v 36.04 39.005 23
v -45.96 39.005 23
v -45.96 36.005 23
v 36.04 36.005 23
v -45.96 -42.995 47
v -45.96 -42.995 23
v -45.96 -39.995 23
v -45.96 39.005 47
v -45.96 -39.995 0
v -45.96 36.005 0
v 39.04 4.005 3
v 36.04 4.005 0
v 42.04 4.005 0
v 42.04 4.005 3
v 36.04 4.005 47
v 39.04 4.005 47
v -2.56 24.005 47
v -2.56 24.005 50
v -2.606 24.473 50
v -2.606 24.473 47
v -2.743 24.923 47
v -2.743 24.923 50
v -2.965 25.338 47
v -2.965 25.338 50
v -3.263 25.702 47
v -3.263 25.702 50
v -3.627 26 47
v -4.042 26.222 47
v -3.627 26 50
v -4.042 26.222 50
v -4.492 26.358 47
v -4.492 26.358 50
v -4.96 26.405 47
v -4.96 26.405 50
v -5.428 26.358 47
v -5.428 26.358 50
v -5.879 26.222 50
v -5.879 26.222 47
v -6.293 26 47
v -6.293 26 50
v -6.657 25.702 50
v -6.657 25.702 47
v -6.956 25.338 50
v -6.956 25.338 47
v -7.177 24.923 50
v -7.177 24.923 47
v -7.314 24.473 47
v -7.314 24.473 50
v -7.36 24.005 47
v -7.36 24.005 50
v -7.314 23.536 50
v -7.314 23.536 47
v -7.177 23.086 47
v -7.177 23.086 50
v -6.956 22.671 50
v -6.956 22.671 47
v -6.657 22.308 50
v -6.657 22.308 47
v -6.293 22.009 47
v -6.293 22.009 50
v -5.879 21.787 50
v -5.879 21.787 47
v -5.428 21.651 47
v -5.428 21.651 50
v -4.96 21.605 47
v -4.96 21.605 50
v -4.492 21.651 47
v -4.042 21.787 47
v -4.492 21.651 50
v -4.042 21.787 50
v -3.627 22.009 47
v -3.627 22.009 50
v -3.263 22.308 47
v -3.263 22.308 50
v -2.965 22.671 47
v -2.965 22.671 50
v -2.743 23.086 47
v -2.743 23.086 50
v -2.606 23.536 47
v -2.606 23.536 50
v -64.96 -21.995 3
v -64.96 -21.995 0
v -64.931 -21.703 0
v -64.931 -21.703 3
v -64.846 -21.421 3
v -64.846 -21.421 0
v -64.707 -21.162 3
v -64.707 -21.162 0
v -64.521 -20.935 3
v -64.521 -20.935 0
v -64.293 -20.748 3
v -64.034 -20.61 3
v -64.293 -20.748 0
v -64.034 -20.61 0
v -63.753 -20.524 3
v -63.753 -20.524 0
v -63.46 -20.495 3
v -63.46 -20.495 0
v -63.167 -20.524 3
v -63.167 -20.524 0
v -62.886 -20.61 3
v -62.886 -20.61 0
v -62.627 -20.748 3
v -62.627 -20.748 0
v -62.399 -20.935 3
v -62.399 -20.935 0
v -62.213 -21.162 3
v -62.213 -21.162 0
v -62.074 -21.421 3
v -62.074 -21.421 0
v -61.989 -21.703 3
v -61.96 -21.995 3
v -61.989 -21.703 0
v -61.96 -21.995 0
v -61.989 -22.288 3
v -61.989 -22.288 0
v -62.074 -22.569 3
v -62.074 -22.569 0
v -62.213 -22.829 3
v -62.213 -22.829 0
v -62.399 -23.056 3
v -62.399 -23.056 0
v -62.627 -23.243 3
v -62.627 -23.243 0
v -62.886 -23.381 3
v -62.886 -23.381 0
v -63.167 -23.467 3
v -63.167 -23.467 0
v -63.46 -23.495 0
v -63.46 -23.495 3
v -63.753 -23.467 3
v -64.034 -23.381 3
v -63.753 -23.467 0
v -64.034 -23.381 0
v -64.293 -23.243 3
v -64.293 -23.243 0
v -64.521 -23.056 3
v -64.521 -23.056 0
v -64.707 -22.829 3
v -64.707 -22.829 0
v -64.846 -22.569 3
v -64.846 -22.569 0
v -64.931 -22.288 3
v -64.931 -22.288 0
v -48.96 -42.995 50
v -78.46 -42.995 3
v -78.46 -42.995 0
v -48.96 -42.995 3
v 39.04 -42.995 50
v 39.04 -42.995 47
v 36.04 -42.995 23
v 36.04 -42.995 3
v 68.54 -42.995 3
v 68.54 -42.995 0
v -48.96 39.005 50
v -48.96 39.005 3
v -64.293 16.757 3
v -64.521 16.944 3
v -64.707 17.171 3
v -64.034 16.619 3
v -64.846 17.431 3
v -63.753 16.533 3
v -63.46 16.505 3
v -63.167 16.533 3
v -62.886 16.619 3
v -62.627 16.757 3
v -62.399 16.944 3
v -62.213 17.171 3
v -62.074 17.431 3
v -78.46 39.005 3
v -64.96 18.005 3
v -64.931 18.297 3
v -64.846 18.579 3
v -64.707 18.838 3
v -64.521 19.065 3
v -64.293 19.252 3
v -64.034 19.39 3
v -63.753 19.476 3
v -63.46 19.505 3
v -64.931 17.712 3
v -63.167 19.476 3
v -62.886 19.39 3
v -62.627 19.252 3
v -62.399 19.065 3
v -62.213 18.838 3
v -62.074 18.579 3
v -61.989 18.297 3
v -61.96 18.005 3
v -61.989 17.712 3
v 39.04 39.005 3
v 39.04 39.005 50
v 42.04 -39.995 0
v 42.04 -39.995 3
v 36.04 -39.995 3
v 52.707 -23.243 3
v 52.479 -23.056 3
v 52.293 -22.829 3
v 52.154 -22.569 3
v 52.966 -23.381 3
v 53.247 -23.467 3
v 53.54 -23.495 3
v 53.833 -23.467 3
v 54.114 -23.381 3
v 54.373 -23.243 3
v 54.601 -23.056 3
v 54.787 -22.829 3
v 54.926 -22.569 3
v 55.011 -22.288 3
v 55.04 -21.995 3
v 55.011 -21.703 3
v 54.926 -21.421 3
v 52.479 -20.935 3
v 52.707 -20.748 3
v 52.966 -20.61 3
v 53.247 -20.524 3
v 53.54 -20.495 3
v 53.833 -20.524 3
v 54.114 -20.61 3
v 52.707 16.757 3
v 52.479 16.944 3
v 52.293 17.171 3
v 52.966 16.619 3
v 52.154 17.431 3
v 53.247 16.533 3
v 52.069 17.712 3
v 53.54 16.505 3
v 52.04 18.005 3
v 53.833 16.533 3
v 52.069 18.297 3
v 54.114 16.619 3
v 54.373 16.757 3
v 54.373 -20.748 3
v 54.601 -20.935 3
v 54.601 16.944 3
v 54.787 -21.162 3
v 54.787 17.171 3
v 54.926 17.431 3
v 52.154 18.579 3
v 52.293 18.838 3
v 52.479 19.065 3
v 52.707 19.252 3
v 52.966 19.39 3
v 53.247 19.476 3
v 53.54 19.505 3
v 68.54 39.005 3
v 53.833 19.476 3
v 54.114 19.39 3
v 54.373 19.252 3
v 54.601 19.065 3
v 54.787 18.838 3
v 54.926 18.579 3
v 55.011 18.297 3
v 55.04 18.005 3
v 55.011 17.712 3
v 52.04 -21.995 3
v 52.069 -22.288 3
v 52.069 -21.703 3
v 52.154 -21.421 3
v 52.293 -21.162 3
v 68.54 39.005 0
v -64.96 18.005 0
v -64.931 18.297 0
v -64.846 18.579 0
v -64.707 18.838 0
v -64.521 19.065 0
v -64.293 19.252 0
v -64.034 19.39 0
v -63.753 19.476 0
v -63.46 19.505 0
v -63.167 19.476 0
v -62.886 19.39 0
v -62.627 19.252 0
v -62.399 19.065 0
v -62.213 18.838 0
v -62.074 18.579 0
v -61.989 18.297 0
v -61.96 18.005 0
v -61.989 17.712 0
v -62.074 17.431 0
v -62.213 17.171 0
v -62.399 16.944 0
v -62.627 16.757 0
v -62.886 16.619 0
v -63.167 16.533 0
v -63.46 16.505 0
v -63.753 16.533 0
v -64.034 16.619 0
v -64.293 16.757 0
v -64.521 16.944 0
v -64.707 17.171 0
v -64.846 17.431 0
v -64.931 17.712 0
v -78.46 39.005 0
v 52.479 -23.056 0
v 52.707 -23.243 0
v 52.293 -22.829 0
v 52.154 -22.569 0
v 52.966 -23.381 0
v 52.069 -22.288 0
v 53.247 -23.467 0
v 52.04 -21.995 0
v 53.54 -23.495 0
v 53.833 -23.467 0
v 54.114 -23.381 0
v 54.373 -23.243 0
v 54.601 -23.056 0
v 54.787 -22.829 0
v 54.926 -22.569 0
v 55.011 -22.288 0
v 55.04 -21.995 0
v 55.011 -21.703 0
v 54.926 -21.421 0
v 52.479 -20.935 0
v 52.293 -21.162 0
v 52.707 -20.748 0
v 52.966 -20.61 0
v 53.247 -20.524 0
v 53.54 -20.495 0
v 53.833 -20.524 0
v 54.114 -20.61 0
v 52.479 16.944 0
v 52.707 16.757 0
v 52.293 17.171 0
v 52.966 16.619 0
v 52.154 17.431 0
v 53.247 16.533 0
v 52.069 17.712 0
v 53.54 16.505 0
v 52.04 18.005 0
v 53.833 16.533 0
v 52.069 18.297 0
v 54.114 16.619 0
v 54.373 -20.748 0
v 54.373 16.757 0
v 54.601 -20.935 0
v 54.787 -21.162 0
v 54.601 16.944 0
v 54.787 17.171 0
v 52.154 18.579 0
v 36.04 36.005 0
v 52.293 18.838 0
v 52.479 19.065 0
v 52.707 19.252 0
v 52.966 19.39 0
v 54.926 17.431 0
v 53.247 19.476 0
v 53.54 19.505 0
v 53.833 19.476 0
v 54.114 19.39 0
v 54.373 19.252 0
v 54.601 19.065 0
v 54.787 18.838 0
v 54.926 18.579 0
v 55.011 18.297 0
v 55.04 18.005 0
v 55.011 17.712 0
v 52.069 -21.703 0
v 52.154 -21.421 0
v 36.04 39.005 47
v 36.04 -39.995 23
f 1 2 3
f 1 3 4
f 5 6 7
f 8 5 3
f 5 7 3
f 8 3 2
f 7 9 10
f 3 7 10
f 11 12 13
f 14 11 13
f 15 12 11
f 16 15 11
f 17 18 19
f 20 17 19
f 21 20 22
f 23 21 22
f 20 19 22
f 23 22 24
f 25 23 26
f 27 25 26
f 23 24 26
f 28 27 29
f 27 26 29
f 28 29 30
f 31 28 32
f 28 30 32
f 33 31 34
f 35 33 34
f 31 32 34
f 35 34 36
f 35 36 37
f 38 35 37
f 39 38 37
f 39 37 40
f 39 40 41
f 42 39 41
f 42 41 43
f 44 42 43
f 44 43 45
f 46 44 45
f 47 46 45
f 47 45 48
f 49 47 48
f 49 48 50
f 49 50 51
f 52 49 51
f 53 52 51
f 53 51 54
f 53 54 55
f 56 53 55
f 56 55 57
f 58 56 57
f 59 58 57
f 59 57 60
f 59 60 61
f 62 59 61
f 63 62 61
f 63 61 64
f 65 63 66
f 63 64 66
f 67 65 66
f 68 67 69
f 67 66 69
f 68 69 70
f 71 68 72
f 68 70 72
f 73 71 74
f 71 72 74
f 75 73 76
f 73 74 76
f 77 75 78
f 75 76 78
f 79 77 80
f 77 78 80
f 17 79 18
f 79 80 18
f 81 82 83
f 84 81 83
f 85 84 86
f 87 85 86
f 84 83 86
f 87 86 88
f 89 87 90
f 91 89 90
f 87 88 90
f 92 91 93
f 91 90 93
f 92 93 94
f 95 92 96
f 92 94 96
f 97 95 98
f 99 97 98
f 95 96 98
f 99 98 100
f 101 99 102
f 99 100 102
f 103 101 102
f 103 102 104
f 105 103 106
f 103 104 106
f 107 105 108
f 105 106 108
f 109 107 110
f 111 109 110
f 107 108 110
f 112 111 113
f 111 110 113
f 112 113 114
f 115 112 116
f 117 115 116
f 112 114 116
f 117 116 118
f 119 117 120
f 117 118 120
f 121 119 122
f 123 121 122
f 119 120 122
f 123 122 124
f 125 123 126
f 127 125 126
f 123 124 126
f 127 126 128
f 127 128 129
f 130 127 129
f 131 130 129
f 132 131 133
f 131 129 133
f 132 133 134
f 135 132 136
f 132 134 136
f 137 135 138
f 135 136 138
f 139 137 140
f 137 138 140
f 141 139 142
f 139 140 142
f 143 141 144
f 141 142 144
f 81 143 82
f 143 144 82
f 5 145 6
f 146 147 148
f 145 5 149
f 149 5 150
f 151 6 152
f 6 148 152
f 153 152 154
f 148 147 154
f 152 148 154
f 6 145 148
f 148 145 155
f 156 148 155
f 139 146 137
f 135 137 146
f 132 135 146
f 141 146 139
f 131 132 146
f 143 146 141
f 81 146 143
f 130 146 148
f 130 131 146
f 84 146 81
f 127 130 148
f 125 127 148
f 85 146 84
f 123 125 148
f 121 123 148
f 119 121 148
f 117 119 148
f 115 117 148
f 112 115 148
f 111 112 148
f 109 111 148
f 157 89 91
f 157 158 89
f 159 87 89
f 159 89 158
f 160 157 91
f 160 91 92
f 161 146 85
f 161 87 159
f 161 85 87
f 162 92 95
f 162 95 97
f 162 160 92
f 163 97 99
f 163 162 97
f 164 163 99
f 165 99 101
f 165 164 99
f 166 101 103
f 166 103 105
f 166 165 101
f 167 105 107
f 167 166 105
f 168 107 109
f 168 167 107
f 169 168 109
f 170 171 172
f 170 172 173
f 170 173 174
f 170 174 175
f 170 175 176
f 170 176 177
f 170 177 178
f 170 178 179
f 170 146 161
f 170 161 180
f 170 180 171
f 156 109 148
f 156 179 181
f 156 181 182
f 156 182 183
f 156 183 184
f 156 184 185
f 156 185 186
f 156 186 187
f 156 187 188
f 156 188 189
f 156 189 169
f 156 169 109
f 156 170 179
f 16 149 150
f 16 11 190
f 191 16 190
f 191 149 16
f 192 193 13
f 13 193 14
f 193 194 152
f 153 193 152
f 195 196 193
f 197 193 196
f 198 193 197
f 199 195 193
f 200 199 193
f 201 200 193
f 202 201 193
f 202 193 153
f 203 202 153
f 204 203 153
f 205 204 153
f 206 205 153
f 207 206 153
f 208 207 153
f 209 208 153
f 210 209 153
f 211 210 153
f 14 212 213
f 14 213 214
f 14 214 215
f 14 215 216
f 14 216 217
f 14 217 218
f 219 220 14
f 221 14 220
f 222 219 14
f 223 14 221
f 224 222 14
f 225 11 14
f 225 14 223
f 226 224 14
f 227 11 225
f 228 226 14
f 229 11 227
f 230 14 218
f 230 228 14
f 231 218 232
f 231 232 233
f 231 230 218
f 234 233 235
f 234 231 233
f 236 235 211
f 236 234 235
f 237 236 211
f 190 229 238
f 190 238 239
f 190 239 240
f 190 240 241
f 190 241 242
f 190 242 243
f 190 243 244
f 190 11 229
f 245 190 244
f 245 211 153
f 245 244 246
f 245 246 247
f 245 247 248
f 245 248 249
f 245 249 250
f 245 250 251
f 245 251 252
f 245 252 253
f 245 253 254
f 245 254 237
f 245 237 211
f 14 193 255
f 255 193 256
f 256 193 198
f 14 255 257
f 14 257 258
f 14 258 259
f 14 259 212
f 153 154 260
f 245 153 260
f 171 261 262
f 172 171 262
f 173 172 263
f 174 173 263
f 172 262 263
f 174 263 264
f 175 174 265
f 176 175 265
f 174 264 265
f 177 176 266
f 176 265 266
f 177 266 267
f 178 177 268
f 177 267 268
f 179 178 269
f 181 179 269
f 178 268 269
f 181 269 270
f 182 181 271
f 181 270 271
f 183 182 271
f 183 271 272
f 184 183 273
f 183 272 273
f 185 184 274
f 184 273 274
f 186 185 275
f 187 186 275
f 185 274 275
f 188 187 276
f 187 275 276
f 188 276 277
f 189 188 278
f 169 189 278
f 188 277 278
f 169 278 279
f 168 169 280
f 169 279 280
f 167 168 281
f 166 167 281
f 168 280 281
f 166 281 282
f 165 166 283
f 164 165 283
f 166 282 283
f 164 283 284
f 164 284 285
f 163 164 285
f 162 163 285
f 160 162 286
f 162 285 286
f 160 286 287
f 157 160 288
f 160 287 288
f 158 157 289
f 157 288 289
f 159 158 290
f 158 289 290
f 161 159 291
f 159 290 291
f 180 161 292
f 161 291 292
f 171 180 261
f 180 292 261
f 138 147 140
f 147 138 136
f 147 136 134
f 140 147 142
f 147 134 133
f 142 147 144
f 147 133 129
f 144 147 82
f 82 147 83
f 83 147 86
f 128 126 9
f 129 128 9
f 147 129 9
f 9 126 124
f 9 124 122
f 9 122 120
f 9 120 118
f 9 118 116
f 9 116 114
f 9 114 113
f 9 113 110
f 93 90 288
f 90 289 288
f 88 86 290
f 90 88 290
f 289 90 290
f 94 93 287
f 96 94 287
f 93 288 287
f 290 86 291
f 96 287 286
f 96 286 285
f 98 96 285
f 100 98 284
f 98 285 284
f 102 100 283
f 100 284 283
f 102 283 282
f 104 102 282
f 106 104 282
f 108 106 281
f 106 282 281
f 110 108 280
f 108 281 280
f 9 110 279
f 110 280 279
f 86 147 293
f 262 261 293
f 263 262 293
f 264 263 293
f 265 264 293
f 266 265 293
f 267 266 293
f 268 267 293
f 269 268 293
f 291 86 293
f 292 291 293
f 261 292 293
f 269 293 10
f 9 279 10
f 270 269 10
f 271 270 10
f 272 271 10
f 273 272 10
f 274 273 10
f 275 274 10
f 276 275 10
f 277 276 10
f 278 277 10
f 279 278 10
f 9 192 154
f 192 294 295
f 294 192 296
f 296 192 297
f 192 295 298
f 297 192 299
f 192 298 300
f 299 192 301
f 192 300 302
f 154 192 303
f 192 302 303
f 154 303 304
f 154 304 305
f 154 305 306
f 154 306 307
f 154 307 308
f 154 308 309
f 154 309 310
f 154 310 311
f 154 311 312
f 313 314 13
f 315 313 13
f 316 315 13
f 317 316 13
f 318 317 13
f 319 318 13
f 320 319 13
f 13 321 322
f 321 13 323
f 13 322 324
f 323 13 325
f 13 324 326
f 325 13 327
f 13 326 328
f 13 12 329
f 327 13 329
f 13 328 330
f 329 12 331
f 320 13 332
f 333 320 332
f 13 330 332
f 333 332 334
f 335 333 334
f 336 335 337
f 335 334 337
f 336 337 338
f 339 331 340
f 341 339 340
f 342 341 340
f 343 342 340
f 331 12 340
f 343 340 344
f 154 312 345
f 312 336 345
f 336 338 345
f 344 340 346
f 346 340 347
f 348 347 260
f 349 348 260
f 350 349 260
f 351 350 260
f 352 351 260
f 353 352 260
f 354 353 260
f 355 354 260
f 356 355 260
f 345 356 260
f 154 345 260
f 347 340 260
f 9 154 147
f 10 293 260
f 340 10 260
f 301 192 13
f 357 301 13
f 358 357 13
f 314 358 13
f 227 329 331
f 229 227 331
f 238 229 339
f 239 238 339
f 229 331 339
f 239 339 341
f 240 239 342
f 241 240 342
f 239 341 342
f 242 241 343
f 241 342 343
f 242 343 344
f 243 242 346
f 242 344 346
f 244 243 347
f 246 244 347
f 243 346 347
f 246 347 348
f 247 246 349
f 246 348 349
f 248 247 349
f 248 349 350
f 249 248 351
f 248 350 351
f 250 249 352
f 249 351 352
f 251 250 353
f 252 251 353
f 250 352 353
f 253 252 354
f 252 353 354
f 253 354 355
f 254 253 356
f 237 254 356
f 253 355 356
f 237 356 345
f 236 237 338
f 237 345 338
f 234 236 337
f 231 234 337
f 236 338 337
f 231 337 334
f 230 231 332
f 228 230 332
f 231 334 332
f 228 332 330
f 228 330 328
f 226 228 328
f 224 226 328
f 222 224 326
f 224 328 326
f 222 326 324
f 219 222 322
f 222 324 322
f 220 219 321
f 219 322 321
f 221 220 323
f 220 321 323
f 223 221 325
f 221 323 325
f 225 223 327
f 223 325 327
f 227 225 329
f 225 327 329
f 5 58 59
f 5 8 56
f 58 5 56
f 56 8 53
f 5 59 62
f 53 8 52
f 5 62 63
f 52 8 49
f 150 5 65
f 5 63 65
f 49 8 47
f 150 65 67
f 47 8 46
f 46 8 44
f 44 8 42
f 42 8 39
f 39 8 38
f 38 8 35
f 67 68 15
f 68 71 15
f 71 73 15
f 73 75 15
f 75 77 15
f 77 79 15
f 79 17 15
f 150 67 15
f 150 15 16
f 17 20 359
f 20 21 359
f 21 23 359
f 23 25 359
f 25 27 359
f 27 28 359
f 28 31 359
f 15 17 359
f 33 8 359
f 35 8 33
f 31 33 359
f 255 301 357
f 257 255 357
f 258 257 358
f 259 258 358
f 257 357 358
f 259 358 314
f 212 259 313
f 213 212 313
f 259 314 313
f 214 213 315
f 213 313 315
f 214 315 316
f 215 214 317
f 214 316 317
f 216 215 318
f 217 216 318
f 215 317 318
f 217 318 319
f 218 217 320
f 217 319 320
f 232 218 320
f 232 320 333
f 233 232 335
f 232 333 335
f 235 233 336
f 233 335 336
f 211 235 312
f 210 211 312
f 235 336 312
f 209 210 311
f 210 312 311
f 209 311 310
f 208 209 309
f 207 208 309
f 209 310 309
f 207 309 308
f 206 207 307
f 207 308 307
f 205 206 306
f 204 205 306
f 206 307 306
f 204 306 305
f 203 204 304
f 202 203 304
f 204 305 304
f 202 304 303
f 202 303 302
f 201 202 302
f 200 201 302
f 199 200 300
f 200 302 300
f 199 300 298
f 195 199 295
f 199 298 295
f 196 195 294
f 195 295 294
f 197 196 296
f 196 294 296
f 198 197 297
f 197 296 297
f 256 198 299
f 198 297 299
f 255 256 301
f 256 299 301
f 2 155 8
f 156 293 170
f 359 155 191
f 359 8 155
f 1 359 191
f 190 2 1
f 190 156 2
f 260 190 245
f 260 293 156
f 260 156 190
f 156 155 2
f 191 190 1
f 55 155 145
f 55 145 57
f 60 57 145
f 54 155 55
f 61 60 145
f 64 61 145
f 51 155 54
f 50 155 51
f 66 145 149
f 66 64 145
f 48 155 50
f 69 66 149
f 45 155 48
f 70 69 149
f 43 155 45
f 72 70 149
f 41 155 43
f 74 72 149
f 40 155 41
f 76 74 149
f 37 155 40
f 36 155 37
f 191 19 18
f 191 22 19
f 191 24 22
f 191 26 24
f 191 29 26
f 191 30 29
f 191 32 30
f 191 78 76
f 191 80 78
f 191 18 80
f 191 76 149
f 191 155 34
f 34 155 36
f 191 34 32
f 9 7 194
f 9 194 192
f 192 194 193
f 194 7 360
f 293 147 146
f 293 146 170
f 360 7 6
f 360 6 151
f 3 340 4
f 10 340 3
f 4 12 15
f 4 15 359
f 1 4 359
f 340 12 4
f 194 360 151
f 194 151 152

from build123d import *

# Parameters (mm, degrees)
SKETCH_1_W          = 147
SKETCH_1_H          = 82
EXTRUDE_1_DEPTH     = 50
SKETCH_2_W          = 29.5
SKETCH_2_H          = 82
CUT_EXTRUDE_1_DEPTH = 47
SKETCH_3_W          = 29.5
SKETCH_3_H          = 82
CUT_EXTRUDE_2_DEPTH = 47
SKETCH_5_W          = 82
SKETCH_5_H          = 76
CUT_EXTRUDE_3_DEPTH = 47
SKETCH_6_R          = 2.4
CUT_EXTRUDE_4_DEPTH = 4
SKETCH_7_W          = 82
SKETCH_7_H          = 24
CUT_EXTRUDE_5_DEPTH = 84
SKETCH_9_W          = 44
SKETCH_9_H          = 47
CUT_EXTRUDE_6_DEPTH = 3
SKETCH_10_W         = 6
SKETCH_10_H         = 44
CUT_EXTRUDE_7_DEPTH = 7
SKETCH_12_R         = 1.5
CUT_EXTRUDE_8_DEPTH = 3


with BuildPart() as part:
    # 草图1 → 凸台-拉伸1 (new body)
    with BuildSketch(Plane.XY):
        with Locations((-4.960122699, -1.995398773)):
            Rectangle(SKETCH_1_W, SKETCH_1_H)
    extrude(amount=EXTRUDE_1_DEPTH)

    # 草图2 → 切除-拉伸1 (cut)
    with BuildSketch(Plane.XY.offset(50)):
        with Locations((-63.710122699, -1.995398773)):
            Rectangle(SKETCH_2_W, SKETCH_2_H)
    extrude(amount=-CUT_EXTRUDE_1_DEPTH, mode=Mode.SUBTRACT)

    # 草图3 → 切除-拉伸2 (cut)
    with BuildSketch(Plane.XY.offset(50)):
        with Locations((53.789877301, -1.995398773)):
            Rectangle(SKETCH_3_W, SKETCH_3_H)
    extrude(amount=-CUT_EXTRUDE_2_DEPTH, mode=Mode.SUBTRACT)

    # 草图5 → 切除-拉伸3 (cut)
    with BuildSketch(Plane(origin=(0, 0, 0), x_dir=(-1, 0, 0), z_dir=(0, 0, -1))):
        with Locations((4.960122699, -1.995398773)):
            Rectangle(SKETCH_5_W, SKETCH_5_H)
    extrude(amount=-CUT_EXTRUDE_3_DEPTH, mode=Mode.SUBTRACT)

    # 草图6 → 切除-拉伸4 (cut)
    with BuildSketch(Plane.XY.offset(50)):
        with Locations((-4.960122699, 24.004601227)):
            Circle(SKETCH_6_R)
    extrude(amount=-CUT_EXTRUDE_4_DEPTH, mode=Mode.SUBTRACT)

    # 草图7 → 切除-拉伸5 (cut)
    with BuildSketch(Plane(origin=(0, 39.004601227, 0), x_dir=(1, 0, 0), z_dir=(0, 1, 0))):
        with Locations((-4.960122699, -35)):
            Rectangle(SKETCH_7_W, SKETCH_7_H)
    extrude(amount=-CUT_EXTRUDE_5_DEPTH, mode=Mode.SUBTRACT)

    # 草图9 → 切除-拉伸6 (cut)
    with BuildSketch(Plane(origin=(39.039877301, 0, 0), x_dir=(0, 0, -1), z_dir=(1, 0, 0))):
        with Locations((-25, -19.495398773)):
            Rectangle(SKETCH_9_W, SKETCH_9_H)
    extrude(amount=-CUT_EXTRUDE_6_DEPTH, mode=Mode.SUBTRACT)

    # 草图10 → 切除-拉伸7 (cut)
    with BuildSketch(Plane.XY.offset(3)):
        with Locations((39.039877301, -17.995398773)):
            Rectangle(SKETCH_10_W, SKETCH_10_H)
    extrude(amount=-CUT_EXTRUDE_7_DEPTH, mode=Mode.SUBTRACT)

    # 草图12 → 切除-拉伸8 (cut)
    with BuildSketch(Plane(origin=(0, 0, 0), x_dir=(-1, 0, 0), z_dir=(0, 0, -1))):
        with Locations((63.460122699, 18.004601227)):
            Circle(SKETCH_12_R)
        with Locations((63.460122699, -21.995398773)):
            Circle(SKETCH_12_R)
        with Locations((-53.539877301, 18.004601227)):
            Circle(SKETCH_12_R)
        with Locations((-53.539877301, -21.995398773)):
            Circle(SKETCH_12_R)
    extrude(amount=-CUT_EXTRUDE_8_DEPTH, mode=Mode.SUBTRACT)


solid = part.part
